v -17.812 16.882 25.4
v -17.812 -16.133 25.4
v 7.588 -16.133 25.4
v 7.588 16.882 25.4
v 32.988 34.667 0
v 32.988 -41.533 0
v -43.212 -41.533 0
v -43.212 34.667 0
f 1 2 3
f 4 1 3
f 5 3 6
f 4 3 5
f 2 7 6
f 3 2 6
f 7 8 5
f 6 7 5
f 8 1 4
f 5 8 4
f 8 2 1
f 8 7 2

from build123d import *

# Parameters (mm, degrees)
F0_W     = 76.2
F0_H     = 76.2
F1_DEPTH = 25.4
F2_SIZE2 = 25.39999
F2_SIZE  = 25.39999
F3_SIZE2 = 17.785261
F3_SIZE  = 25.39999
F4_SIZE2 = 25.39999
F4_SIZE  = 25.39999
F5_SIZE2 = 25.39999
F5_SIZE  = 25.39999


# Not quite as in the source:
# - a fillet or chamfer is up to 0.001 mm smaller than in the source, because OpenCascade refuses the exact size


with BuildPart() as f1:
    # F0 (on Top) → F1 (new body)
    with BuildSketch(Plane.XY):
        with Locations((-5.1121336523, -3.4328531474)):
            Rectangle(F0_W, F0_H)
    extrude(amount=F1_DEPTH)

    # F2 (size 25.4 and 25.4 in the source; OpenCascade refuses exactly that, so slightly less here)
    f2_edges = [f1.edges().sort_by_distance(p)[0] for p in [
        (32.987866, -3.432853, 25.4),
    ]]
    chamfer(f2_edges, length=F2_SIZE, length2=F2_SIZE2)

    # F3 (size 25.4 and 17.7852714705 in the source; OpenCascade refuses exactly that, so slightly less here)
    f3_edges = [f1.edges().sort_by_distance(p)[0] for p in [
        (-17.812129, 34.667147, 25.4),
    ]]
    f3_side = f1.faces().sort_by_distance((-11.038795, 34.667147, 11.853333))[0]
    chamfer(f3_edges, length=F3_SIZE, length2=F3_SIZE2, reference=f3_side)

    # F4 (size 25.4 and 25.4 in the source; OpenCascade refuses exactly that, so slightly less here)
    f4_edges = [f1.edges().sort_by_distance(p)[0] for p in [
        (-43.212134, -12.325484, 25.4),
    ]]
    chamfer(f4_edges, length=F4_SIZE, length2=F4_SIZE2)

    # F5 (size 25.4 and 25.4 in the source; OpenCascade refuses exactly that, so slightly less here)
    f5_edges = [f1.edges().sort_by_distance(p)[0] for p in [
        (-5.112134, -41.532853, 25.4),
    ]]
    chamfer(f5_edges, length=F5_SIZE, length2=F5_SIZE2)


solid = f1.part
